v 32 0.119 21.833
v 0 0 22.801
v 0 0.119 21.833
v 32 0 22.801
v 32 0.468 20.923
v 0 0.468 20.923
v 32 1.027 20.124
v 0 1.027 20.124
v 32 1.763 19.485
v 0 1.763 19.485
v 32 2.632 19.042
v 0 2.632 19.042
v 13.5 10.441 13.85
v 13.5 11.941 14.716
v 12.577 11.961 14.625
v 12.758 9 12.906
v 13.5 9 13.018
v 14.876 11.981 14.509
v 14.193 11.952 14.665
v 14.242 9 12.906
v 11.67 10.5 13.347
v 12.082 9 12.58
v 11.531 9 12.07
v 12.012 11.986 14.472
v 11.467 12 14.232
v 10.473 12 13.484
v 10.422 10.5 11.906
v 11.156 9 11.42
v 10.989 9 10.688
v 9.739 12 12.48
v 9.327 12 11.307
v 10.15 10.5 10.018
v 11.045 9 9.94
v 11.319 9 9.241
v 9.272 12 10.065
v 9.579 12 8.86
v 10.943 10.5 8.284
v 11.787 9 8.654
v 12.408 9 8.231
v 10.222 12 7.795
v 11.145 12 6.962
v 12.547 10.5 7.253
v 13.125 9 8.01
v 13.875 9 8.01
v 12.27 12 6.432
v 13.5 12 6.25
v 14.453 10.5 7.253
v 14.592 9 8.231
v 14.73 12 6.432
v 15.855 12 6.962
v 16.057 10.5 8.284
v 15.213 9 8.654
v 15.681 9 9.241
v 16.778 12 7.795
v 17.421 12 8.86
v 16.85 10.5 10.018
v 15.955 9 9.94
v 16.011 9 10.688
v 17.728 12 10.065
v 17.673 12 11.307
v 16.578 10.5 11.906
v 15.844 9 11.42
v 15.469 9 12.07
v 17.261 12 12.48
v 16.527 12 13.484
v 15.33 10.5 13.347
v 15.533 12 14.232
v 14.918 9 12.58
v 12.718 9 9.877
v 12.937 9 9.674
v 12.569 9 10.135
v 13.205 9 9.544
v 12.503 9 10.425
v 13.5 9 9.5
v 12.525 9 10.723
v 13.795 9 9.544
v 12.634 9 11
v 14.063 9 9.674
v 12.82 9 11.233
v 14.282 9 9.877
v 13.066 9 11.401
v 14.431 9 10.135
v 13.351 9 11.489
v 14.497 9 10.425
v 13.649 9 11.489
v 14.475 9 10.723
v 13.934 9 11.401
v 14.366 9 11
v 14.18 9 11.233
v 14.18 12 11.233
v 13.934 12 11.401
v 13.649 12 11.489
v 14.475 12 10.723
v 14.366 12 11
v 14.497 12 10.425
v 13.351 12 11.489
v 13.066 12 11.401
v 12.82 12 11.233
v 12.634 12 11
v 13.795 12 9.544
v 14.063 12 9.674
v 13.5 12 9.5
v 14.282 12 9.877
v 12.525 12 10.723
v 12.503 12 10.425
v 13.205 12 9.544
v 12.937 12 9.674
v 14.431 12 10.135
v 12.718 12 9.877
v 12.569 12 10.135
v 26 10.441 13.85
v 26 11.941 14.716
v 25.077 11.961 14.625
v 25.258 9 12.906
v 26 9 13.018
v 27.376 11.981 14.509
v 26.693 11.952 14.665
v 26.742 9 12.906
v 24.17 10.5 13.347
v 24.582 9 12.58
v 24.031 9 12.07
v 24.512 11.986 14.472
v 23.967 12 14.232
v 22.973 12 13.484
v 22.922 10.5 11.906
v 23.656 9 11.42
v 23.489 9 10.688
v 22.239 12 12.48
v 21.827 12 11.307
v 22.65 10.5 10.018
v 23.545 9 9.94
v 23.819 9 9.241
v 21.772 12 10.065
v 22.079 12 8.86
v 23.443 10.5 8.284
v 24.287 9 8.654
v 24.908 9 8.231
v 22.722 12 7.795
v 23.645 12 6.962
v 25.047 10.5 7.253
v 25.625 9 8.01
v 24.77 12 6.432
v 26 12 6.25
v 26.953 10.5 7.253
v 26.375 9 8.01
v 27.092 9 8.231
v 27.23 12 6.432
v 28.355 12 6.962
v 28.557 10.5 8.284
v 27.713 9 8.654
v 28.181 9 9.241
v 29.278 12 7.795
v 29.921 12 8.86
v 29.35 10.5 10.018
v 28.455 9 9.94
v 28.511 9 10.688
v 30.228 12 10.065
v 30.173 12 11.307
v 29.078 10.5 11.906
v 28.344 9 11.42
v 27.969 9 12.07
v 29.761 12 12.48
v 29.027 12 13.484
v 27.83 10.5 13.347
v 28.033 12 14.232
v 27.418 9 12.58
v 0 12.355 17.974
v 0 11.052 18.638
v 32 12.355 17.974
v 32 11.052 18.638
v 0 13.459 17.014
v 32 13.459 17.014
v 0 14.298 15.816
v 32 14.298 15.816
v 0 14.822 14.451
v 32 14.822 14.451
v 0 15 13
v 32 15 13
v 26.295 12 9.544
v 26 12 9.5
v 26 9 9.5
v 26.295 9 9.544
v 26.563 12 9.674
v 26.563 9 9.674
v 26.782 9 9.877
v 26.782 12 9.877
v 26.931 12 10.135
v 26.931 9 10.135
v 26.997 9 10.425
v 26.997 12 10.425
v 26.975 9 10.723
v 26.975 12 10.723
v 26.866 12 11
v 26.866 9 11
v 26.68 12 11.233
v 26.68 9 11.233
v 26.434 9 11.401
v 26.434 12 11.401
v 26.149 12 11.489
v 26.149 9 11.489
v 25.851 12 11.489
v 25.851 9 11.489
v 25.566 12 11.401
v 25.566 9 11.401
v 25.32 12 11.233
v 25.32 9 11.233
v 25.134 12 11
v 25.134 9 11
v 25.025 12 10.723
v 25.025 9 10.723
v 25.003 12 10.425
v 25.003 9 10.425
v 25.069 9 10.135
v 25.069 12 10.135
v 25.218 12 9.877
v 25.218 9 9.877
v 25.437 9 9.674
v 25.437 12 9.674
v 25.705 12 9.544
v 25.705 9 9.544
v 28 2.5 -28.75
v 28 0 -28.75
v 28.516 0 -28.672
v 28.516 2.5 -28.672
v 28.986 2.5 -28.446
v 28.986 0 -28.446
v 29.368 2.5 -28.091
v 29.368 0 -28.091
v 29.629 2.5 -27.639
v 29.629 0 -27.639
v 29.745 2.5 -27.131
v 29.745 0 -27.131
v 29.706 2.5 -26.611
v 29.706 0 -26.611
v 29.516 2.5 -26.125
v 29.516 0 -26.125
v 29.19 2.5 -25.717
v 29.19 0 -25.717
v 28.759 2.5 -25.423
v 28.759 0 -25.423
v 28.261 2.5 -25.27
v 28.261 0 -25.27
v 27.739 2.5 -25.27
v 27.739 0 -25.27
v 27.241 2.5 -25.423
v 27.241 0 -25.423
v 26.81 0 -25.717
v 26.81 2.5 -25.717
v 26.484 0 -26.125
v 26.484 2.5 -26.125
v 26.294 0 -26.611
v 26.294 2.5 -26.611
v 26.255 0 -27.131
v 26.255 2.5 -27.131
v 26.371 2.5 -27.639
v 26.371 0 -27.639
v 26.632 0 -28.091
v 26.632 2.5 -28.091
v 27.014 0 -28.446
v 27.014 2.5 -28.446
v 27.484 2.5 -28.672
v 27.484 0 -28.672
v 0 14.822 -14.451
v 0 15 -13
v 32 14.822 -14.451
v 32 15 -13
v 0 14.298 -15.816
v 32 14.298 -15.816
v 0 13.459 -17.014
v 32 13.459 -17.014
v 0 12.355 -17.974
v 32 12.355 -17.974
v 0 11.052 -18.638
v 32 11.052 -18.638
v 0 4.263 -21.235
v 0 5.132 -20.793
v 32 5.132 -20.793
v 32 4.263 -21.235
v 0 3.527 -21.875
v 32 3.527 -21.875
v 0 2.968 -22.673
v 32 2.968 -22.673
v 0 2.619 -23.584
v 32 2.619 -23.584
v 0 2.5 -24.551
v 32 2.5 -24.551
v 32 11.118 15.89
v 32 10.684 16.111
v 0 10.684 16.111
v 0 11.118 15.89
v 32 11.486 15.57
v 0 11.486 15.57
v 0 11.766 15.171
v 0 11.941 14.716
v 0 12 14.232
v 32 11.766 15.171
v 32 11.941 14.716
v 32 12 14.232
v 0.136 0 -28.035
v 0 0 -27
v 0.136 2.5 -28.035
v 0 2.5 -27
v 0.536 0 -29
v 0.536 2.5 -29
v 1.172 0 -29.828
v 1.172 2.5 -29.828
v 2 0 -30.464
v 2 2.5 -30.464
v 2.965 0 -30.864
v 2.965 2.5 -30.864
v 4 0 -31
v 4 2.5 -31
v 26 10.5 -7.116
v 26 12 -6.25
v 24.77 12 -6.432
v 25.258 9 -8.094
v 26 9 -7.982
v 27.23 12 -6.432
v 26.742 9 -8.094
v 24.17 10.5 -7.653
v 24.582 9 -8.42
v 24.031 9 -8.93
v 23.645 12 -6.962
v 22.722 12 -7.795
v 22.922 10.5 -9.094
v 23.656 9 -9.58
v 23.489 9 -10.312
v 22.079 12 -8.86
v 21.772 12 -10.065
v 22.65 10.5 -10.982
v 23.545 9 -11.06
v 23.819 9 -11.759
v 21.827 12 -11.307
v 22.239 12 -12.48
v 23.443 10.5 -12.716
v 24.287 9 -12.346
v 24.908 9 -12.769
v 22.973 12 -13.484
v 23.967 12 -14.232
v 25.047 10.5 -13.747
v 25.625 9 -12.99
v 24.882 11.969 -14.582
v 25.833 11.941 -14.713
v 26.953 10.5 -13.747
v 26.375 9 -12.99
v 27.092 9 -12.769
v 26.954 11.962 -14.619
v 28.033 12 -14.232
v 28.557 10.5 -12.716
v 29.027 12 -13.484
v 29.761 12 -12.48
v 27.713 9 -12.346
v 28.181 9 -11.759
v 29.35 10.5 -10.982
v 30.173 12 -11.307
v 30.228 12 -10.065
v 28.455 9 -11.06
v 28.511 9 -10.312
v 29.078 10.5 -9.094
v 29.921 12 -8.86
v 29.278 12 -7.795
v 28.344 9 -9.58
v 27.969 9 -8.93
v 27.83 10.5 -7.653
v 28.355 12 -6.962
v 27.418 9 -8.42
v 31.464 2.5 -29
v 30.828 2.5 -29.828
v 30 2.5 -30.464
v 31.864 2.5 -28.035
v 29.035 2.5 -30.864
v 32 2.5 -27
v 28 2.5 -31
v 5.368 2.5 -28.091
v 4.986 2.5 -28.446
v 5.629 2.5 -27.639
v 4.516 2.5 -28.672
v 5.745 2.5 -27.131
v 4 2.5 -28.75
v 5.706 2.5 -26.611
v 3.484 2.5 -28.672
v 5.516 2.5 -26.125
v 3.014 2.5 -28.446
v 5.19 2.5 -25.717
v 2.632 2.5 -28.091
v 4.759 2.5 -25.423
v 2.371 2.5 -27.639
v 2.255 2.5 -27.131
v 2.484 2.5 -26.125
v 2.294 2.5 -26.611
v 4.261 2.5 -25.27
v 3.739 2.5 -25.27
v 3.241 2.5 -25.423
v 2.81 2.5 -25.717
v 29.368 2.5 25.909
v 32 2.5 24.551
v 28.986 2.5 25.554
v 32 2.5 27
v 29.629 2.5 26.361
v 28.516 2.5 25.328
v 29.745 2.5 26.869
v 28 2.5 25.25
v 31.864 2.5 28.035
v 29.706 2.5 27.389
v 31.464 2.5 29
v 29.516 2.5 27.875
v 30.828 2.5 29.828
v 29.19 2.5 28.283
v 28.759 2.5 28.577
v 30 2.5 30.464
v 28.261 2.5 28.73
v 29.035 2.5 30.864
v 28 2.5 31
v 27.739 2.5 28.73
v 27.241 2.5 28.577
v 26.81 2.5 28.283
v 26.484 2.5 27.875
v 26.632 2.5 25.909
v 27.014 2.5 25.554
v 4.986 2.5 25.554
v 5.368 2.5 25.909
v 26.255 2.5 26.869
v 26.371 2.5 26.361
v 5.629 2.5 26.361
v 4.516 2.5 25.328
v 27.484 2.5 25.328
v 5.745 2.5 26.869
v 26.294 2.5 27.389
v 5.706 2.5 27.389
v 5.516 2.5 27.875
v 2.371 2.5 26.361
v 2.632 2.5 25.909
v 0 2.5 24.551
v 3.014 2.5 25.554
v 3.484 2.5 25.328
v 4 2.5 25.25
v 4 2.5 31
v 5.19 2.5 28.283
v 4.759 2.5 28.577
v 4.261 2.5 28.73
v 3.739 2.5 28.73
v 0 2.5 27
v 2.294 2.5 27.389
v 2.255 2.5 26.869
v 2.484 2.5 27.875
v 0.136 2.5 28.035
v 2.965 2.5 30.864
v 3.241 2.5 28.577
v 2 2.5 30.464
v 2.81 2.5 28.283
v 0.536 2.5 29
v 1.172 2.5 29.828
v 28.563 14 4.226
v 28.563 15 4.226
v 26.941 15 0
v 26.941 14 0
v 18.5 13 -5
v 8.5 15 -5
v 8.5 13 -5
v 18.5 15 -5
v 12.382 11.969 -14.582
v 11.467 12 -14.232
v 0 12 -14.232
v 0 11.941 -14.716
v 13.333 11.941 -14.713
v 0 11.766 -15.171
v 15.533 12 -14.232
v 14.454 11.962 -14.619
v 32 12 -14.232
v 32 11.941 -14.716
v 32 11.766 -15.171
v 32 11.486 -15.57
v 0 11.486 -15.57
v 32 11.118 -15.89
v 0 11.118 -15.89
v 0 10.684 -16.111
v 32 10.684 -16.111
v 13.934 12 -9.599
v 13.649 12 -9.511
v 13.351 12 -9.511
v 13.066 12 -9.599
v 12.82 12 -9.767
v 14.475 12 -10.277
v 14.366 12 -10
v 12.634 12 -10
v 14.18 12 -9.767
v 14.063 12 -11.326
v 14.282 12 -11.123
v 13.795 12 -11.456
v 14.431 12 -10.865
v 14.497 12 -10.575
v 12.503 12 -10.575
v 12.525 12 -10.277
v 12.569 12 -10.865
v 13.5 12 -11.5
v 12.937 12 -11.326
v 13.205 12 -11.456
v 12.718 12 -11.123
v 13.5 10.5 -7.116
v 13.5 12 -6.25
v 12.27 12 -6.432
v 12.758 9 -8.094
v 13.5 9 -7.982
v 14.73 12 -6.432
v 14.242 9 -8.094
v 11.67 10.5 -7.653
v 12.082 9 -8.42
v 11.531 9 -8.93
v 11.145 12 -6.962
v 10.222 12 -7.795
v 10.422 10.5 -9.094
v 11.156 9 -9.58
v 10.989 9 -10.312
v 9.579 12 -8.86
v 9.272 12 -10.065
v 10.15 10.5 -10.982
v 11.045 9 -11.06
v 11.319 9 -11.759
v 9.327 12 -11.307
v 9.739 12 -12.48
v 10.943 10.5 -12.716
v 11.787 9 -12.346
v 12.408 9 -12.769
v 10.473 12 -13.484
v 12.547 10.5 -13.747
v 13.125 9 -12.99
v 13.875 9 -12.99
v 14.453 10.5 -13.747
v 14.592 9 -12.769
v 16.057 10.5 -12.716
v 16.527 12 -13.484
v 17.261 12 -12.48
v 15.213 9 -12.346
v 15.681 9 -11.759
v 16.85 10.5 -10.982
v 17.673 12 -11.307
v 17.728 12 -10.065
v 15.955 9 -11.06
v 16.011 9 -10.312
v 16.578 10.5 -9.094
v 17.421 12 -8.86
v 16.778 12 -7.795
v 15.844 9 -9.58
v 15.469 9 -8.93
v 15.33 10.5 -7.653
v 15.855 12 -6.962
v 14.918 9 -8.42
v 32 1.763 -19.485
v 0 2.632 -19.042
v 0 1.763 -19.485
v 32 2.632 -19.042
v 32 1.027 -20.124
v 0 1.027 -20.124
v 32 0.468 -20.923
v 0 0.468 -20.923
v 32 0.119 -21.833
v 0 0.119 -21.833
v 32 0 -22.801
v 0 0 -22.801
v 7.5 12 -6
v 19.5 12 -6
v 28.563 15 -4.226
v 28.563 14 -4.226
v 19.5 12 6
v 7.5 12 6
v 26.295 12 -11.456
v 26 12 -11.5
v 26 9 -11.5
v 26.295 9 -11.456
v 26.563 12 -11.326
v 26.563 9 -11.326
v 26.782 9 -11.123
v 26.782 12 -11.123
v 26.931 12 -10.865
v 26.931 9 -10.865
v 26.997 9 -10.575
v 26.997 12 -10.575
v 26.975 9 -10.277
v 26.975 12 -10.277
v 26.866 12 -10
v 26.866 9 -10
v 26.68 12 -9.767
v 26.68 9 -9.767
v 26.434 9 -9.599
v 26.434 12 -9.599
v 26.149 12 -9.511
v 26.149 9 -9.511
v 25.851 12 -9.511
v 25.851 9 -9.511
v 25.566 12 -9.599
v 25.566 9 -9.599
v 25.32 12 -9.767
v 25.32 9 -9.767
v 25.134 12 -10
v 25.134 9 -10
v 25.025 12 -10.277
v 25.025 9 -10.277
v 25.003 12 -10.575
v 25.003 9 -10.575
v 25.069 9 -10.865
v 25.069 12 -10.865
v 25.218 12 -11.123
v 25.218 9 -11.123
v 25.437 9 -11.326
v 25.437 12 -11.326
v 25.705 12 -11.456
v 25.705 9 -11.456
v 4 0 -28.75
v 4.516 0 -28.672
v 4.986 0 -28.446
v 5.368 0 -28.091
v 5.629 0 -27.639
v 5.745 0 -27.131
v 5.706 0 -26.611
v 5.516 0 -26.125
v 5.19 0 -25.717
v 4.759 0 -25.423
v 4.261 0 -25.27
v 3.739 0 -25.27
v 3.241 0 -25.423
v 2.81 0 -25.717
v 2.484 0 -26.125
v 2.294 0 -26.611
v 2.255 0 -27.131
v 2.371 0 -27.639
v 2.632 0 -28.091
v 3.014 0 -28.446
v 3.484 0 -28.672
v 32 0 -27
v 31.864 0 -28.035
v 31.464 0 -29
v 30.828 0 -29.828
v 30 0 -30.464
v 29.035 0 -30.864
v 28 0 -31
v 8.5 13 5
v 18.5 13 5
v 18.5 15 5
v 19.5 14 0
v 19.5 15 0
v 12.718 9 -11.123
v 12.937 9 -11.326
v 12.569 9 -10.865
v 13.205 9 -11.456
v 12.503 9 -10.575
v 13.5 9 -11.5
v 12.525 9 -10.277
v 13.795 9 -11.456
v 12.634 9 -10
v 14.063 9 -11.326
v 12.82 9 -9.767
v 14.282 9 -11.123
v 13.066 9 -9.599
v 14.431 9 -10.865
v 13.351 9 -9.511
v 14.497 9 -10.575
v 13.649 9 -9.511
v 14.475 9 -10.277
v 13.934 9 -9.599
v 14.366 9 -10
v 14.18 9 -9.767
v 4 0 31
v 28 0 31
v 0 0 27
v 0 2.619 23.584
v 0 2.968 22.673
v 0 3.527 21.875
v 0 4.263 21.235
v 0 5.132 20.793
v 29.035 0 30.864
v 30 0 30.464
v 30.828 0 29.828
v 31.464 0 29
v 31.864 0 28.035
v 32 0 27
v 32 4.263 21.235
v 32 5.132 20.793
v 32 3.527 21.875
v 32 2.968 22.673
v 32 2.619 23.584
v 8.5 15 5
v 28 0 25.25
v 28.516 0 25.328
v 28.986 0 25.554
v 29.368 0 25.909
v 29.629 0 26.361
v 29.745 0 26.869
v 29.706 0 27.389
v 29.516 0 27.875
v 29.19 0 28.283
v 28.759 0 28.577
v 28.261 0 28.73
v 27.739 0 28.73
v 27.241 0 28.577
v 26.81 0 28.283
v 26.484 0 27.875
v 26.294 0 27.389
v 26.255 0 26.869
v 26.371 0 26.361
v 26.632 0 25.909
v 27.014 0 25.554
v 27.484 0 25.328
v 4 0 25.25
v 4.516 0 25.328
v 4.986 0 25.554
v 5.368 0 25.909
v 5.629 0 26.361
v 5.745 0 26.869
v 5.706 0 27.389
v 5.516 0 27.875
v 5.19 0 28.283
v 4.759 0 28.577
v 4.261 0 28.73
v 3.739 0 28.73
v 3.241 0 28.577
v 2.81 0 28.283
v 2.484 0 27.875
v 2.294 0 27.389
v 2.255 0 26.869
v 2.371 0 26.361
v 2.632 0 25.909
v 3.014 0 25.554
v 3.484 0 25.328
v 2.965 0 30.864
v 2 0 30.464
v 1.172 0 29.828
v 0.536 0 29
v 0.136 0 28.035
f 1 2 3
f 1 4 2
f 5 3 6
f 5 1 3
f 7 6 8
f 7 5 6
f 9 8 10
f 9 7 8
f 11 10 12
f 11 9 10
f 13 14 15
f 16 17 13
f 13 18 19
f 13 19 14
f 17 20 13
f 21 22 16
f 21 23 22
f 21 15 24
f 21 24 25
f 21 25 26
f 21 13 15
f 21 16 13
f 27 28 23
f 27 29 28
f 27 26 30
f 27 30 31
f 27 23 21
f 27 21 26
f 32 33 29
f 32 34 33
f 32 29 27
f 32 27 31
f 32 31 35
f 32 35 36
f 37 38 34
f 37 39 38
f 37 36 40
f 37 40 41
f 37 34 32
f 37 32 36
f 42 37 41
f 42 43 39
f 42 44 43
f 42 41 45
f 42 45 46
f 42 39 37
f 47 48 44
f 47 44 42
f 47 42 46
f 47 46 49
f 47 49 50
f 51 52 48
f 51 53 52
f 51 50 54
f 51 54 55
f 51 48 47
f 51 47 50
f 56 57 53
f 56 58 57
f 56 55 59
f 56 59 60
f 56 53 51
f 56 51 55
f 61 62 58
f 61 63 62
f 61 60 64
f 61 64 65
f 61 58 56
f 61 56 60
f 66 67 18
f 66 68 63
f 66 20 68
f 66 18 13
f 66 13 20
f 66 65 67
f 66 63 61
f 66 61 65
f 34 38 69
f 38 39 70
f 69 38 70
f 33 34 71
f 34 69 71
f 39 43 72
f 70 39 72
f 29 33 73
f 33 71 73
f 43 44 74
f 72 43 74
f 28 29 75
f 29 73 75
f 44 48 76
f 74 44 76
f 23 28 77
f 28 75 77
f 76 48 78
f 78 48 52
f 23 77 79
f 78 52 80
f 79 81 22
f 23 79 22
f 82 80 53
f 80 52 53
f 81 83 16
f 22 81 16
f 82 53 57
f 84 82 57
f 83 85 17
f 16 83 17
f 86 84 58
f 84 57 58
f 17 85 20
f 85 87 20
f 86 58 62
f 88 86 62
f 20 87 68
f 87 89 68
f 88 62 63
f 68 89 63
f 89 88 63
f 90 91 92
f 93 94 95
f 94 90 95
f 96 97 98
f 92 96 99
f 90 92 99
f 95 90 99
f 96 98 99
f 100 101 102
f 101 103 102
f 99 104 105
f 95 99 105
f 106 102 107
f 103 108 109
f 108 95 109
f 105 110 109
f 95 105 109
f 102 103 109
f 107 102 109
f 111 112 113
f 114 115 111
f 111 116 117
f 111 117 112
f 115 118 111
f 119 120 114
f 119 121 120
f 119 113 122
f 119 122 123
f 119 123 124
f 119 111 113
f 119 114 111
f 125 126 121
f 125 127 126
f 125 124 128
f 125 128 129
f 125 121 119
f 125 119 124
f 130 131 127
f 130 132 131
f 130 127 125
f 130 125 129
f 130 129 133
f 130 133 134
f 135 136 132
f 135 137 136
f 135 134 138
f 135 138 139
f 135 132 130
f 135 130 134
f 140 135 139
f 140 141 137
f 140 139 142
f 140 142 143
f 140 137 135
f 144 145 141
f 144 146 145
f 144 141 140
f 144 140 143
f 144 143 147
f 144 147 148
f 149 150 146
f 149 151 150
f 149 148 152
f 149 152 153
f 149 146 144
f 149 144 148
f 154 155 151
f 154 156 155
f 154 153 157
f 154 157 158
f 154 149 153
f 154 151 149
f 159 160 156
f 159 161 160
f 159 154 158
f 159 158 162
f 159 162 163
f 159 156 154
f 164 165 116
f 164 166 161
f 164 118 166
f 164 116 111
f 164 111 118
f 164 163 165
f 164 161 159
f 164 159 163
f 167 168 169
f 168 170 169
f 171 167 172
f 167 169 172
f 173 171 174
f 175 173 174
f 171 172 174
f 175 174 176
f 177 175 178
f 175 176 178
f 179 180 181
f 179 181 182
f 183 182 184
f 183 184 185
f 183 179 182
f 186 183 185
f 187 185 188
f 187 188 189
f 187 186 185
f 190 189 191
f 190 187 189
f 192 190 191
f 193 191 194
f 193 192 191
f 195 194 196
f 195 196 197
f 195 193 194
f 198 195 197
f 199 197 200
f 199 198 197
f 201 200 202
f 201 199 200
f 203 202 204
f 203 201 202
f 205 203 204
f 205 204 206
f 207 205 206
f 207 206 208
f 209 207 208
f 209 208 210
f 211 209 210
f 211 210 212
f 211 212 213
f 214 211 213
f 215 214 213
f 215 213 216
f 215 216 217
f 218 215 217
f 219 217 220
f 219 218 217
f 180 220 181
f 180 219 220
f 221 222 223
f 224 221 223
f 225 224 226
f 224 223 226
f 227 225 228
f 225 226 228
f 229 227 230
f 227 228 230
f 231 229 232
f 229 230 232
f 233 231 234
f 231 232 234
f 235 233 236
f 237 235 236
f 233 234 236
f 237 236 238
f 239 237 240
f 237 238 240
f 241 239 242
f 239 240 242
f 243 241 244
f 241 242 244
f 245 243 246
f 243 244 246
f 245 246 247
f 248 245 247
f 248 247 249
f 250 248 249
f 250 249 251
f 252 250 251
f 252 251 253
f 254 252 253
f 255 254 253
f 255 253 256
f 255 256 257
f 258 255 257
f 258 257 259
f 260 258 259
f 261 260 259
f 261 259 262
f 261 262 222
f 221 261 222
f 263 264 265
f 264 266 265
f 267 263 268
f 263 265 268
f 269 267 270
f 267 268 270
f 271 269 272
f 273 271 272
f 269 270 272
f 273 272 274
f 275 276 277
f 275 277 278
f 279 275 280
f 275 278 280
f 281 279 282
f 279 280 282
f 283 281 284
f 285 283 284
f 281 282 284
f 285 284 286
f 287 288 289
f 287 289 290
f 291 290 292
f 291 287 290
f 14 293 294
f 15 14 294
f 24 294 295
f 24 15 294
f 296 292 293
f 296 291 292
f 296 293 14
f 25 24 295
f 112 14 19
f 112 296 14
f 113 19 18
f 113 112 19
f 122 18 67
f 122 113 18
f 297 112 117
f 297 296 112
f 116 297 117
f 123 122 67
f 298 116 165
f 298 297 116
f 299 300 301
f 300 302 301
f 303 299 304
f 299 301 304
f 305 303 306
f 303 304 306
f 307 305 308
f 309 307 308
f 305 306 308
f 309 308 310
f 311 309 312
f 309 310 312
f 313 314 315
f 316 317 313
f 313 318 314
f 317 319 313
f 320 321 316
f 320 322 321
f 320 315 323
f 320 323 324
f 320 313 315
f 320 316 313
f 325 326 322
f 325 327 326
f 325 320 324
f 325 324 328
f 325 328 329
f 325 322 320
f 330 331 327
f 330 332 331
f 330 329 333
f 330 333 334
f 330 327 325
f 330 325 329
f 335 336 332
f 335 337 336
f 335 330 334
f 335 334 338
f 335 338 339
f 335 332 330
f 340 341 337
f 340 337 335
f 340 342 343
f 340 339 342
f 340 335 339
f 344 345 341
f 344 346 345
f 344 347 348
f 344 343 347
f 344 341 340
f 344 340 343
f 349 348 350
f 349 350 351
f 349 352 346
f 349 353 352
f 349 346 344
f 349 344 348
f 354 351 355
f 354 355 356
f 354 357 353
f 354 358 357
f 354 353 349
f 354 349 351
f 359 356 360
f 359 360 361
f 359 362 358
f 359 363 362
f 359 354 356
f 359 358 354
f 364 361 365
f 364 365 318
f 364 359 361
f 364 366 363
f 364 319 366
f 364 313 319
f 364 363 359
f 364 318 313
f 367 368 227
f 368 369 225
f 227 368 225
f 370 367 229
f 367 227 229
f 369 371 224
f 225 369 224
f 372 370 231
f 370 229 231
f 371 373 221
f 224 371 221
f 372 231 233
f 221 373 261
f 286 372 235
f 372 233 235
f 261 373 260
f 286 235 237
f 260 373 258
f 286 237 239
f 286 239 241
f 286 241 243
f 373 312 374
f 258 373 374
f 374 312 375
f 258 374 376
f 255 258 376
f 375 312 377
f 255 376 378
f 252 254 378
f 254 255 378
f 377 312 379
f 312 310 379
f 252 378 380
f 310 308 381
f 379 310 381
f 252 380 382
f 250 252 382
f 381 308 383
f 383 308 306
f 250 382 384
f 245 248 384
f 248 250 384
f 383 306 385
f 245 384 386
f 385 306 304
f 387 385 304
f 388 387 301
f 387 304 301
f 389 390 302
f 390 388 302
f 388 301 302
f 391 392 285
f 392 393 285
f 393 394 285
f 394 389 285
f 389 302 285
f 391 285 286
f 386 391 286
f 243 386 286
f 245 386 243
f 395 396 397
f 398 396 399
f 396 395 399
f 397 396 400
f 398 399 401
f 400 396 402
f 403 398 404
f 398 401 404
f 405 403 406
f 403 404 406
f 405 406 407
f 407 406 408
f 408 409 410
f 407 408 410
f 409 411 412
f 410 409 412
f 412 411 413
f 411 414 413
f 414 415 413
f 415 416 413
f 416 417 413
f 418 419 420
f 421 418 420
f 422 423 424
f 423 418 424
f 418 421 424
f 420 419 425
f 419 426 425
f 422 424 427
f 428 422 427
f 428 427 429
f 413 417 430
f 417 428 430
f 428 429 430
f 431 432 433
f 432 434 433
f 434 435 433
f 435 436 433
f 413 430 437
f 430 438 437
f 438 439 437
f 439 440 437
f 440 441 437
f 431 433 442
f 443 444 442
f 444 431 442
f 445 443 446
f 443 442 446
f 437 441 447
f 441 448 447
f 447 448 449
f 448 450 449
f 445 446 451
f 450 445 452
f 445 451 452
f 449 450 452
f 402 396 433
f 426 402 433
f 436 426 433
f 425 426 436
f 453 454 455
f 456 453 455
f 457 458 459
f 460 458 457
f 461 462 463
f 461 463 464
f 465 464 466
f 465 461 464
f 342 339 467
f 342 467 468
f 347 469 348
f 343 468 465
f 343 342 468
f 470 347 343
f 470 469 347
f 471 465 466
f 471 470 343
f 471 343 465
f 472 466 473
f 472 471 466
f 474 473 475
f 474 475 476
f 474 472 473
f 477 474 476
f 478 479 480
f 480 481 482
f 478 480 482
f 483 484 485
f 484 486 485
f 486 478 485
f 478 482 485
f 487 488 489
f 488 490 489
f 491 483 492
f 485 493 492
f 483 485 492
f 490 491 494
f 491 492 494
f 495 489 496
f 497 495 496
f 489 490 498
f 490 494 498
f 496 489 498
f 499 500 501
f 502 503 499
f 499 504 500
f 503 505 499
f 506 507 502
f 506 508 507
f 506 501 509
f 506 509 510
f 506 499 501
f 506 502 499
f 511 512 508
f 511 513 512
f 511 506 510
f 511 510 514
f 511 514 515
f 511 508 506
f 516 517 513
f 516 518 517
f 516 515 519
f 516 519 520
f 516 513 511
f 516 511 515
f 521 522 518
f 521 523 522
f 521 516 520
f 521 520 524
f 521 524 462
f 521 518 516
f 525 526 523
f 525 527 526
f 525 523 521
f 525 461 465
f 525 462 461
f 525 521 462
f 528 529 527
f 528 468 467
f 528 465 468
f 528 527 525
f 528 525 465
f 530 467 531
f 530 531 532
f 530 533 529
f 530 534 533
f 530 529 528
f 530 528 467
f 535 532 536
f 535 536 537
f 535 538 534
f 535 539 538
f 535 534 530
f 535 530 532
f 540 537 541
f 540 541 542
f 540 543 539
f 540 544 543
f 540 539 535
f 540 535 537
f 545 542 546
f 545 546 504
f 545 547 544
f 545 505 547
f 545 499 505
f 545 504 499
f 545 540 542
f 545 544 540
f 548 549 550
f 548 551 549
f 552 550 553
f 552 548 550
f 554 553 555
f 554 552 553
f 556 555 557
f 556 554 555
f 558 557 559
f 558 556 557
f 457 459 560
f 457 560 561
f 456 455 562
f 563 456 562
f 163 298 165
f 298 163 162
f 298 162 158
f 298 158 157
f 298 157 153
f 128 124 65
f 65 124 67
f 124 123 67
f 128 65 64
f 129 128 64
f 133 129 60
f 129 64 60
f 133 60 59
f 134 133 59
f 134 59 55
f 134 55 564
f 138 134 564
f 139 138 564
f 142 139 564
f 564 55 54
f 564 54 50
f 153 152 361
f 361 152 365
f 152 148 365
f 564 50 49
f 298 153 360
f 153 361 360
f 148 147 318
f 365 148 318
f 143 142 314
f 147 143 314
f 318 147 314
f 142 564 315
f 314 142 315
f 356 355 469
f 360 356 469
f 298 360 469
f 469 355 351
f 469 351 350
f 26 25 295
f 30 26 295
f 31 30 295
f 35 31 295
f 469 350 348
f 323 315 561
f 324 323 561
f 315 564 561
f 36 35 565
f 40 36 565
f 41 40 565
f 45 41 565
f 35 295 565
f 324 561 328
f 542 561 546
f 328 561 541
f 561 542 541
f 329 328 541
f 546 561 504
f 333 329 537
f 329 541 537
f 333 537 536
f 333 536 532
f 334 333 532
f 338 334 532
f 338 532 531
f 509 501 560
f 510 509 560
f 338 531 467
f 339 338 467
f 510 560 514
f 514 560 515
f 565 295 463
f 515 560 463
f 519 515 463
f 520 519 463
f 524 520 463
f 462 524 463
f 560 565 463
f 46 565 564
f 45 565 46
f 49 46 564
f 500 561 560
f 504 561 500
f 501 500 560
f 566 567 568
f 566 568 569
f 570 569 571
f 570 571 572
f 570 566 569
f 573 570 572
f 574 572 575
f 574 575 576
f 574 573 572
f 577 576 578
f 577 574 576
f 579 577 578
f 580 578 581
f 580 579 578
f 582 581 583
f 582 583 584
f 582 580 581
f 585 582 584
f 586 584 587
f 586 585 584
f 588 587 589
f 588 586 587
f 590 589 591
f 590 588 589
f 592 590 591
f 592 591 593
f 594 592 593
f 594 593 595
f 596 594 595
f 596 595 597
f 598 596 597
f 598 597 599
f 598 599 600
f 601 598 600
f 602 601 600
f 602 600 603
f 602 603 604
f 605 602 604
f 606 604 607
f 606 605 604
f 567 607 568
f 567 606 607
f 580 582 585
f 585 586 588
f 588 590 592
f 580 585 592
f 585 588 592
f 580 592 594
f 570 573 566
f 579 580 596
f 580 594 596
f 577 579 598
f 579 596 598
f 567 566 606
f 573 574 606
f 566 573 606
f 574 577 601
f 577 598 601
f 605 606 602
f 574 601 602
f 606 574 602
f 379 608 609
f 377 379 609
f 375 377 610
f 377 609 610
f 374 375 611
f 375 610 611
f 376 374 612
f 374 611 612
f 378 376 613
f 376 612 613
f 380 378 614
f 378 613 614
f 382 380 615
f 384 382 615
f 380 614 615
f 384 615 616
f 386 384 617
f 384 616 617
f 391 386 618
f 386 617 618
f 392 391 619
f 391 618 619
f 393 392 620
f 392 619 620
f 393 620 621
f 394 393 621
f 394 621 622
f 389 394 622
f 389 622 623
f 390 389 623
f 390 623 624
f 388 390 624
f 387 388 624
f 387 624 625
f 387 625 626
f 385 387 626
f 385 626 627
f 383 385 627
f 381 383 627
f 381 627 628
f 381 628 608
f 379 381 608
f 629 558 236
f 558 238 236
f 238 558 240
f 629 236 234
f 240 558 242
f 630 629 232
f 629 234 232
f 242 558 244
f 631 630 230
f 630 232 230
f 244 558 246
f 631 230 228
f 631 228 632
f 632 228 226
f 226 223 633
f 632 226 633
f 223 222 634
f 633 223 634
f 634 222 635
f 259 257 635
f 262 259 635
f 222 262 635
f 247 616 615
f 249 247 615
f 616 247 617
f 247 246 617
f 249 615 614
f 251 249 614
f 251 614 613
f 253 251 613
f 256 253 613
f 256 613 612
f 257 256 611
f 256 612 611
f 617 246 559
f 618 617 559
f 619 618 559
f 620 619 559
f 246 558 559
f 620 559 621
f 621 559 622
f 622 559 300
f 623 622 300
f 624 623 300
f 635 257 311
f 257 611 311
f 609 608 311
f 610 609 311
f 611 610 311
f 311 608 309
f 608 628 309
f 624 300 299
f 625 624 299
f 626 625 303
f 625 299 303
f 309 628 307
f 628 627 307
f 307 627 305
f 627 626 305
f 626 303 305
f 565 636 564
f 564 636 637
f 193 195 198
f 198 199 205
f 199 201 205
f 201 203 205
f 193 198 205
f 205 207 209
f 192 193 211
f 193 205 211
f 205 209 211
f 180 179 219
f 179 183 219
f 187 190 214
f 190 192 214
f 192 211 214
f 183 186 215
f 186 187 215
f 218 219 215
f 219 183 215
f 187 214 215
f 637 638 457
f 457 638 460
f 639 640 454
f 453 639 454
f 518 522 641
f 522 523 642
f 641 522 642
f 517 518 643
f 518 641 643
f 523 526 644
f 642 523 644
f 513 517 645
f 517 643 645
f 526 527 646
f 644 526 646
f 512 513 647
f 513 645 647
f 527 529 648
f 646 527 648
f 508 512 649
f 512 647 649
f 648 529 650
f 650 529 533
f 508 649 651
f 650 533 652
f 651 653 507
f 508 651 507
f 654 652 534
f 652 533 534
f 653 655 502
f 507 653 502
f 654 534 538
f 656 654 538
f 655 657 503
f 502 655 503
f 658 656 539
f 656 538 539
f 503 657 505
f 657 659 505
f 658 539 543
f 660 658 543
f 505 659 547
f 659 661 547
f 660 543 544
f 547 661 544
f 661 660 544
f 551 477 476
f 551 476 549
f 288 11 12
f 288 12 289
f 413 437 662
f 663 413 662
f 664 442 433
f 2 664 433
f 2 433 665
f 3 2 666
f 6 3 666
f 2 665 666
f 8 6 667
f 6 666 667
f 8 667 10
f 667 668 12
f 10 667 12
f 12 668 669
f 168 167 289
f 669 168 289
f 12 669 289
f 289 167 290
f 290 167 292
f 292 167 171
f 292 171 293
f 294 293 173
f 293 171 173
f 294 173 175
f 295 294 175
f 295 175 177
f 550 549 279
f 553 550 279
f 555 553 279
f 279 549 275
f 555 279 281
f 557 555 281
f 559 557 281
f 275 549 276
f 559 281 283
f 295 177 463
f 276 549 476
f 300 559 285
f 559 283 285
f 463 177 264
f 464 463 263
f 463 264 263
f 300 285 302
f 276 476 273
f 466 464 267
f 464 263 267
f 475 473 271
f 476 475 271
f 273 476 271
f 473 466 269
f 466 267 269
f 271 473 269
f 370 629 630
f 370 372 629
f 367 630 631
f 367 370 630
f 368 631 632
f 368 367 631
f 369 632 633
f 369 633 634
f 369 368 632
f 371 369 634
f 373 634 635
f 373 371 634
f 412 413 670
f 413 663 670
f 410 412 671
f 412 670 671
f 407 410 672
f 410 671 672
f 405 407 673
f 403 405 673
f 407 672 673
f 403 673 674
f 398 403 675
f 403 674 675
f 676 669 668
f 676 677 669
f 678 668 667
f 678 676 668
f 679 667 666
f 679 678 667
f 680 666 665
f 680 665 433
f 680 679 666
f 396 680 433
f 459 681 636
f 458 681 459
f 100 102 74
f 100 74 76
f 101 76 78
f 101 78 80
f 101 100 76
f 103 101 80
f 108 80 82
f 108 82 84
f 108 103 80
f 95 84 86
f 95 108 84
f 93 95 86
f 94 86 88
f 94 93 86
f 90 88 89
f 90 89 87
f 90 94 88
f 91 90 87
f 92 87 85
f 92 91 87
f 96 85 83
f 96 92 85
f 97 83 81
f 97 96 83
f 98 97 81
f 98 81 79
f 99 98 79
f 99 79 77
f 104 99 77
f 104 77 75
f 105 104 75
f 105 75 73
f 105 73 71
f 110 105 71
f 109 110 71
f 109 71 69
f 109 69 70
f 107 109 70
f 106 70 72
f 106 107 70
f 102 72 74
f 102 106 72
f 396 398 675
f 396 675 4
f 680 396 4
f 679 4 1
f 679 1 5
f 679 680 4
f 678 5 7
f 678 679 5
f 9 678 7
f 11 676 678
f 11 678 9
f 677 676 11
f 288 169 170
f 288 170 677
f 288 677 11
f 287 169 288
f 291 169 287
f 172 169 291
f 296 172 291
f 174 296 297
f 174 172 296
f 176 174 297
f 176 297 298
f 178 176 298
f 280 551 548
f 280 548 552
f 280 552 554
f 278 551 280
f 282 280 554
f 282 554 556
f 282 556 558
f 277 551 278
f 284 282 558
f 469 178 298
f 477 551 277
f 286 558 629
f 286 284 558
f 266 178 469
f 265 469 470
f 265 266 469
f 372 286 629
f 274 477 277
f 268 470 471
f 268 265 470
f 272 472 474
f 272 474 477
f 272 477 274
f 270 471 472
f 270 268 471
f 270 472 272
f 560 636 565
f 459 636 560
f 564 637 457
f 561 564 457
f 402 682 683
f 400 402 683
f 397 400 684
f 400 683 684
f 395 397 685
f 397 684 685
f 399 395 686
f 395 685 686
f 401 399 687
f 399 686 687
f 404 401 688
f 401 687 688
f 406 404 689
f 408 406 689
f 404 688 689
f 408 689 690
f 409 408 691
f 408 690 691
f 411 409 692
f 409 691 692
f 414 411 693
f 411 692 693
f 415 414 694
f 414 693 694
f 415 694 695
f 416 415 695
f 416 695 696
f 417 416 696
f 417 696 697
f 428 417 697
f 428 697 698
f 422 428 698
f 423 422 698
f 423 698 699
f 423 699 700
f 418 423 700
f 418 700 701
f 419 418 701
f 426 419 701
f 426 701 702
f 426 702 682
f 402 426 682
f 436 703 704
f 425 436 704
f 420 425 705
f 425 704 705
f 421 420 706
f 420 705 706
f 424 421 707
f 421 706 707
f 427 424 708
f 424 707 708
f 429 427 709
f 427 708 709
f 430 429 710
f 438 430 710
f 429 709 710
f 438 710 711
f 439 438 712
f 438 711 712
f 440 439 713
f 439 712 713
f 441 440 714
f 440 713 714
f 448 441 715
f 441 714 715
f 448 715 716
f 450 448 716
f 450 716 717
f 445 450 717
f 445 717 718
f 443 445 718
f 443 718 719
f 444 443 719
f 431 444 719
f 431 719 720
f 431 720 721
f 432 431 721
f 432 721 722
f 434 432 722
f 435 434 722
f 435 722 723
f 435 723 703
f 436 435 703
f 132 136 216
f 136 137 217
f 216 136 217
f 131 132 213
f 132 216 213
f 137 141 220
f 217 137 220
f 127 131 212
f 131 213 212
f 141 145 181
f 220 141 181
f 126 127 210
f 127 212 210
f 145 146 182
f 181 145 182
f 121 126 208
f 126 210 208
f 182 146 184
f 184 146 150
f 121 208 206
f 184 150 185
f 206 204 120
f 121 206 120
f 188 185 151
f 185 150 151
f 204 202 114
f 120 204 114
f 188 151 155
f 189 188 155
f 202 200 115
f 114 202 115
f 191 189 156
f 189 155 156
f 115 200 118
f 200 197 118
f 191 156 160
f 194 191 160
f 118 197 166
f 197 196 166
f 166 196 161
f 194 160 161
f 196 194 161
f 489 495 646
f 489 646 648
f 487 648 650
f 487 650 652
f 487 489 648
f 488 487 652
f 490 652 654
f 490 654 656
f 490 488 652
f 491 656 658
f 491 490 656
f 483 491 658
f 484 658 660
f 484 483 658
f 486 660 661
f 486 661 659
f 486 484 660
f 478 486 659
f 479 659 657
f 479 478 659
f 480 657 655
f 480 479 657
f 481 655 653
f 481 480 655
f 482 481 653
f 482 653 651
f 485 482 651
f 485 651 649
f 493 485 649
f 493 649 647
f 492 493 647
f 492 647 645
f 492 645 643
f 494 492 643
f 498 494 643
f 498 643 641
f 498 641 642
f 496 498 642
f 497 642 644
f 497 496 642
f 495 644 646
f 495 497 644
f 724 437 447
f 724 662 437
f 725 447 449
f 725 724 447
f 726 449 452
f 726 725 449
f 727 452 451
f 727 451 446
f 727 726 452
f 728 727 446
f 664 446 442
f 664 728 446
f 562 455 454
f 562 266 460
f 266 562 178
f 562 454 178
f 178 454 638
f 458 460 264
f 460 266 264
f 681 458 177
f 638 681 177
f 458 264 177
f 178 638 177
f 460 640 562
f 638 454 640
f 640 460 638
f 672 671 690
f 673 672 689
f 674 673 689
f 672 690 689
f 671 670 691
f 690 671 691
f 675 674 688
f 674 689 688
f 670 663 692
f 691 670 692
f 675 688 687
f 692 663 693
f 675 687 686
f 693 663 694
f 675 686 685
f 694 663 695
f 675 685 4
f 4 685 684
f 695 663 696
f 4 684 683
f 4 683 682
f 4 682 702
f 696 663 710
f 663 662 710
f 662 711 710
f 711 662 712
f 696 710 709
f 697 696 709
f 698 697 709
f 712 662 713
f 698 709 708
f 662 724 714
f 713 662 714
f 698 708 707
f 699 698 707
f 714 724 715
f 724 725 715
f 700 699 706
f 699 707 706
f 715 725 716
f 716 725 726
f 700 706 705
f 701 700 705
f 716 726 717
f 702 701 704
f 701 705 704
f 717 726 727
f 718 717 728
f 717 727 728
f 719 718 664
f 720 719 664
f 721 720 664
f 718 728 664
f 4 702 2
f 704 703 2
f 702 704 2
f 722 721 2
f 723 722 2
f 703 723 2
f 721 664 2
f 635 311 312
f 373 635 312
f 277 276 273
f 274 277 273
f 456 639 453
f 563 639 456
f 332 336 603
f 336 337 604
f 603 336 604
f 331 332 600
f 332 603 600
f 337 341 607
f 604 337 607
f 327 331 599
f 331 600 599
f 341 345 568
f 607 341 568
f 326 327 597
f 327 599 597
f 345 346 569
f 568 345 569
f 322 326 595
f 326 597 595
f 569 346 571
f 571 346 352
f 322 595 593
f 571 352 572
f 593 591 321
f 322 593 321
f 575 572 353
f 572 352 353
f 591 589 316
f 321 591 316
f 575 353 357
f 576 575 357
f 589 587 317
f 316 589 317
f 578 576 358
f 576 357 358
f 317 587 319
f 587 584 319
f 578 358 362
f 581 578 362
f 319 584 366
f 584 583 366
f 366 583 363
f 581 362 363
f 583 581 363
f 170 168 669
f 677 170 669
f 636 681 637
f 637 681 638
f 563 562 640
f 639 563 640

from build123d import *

# Parameters (mm, degrees)
EXTRUDE_1_DEPTH                      = 32
SKETCH_2_R                           = 1.75
CUT_EXTRUDE_1_DEPTH                  = 48.010637094
PATTERN_LINEAR_1_COUNT               = 2
PATTERN_LINEAR_1_PITCH               = 24
PATTERN_LINEAR_1_COUNT_DIR2          = 2
PATTERN_LINEAR_1_PITCH_DIR2          = 54
FILLET_1_R                           = 4
FILLET_3_R                           = 6
FILLET_5_R                           = 4
SKETCH_4_W                           = 10
SKETCH_4_H                           = 10
CUT_EXTRUDE_3_DEPTH                  = 48.010637094
FILLET_6_R                           = 2
SKETCH_3_R                           = 2.5
SKETCH_3_R_2                         = 1
EXTRUDE_3_DEPTH                      = 3
CHAMFER_3_SIZE                       = 1.75
CHAMFER_3_SIZE_2                     = 3.031088913
PATTERN_LINEAR_5_COUNT               = 2
PATTERN_LINEAR_5_PITCH               = 12.5
PATTERN_LINEAR_5_COUNT_DIR2          = 2
PATTERN_LINEAR_5_PITCH_DIR2          = 21
CHAMFER_3_OF_PATTERN_LINEAR_5_SIZE   = 1.75
CHAMFER_3_OF_PATTERN_LINEAR_5_SIZE_2 = 3.031088913
CUT_EXTRUDE_5_DEPTH                  = 1
CHAMFER_4_SIZE                       = 1


with BuildPart() as part:
    # Эскиз1 → Бобышка-Вытянуть1 (new body)
    with BuildSketch(Plane(origin=(0, 0, 0), x_dir=(0, 0, -1), z_dir=(1, 0, 0))):
        Polygon((-31, 0), (-20, 0), (-15.632357189, 12), (15.632357189, 12), (20, 0), (31, 0), (31, 2.5), (21.750518846, 2.5), (17.200890917, 15), (-17.200890917, 15), (-21.750518846, 2.5), (-31, 2.5), align=None)
    extrude(amount=EXTRUDE_1_DEPTH)

    # Эскиз2 → Вырез-Вытянуть1 (cut, through all)
    with BuildSketch(Plane.XZ):
        with Locations(Location((4, 27, 0), (0, 0, 270))):
            Circle(SKETCH_2_R)
    cut_extrude_1 = extrude(amount=-CUT_EXTRUDE_1_DEPTH, mode=Mode.SUBTRACT)

    # Линейный массив1: Cut-Extrude 1 2 × 2
    with Locations(*[(i * PATTERN_LINEAR_1_PITCH, 0, -j * PATTERN_LINEAR_1_PITCH_DIR2) for i in range(PATTERN_LINEAR_1_COUNT) for j in range(PATTERN_LINEAR_1_COUNT_DIR2) if (i, j) != (0, 0)]):
        add(cut_extrude_1, mode=Mode.SUBTRACT)

    # Скругление1
    fillet_1_edges = [part.edges().sort_by_distance(p)[0] for p in [
        (0, 1.25, -31),
        (0, 1.25, 31),
        (32, 1.25, -31),
        (32, 1.25, 31),
    ]]
    fillet(fillet_1_edges, radius=FILLET_1_R)

    # Скругление3
    fillet_3_edges = [part.edges().sort_by_distance(p)[0] for p in [
        (16, 15, 17.200890917),
        (16, 15, -17.200890917),
    ]]
    fillet(fillet_3_edges, radius=FILLET_3_R)

    # Скругление5
    fillet_5_edges = [part.edges().sort_by_distance(p)[0] for p in [
        (16, 2.5, 21.750518846),
        (16, 2.5, -21.750518846),
        (16, 0, -20),
        (16, 0, 20),
    ]]
    fillet(fillet_5_edges, radius=FILLET_5_R)

    # Эскиз4 → Вырез-Вытянуть3 (cut, through all)
    with BuildSketch(Plane(origin=(0, 15, 0), x_dir=(1, 0, 0), z_dir=(0, 1, 0))):
        with Locations((13.5, 0)):
            Rectangle(SKETCH_4_W, SKETCH_4_H)
    extrude(amount=-CUT_EXTRUDE_3_DEPTH, mode=Mode.SUBTRACT)

    # Скругление6
    fillet_6_edges = [part.edges().sort_by_distance(p)[0] for p in [
        (16, 12, -15.632357189),
        (16, 12, 15.632357189),
    ]]
    fillet(fillet_6_edges, radius=FILLET_6_R)

    # Эскиз3 → Бобышка-Вытянуть3 (add)
    with BuildSketch(Plane.XZ.offset(-12)):
        with Locations(Location((26, 10.5, 0), (0, 0, 90))):
            Circle(SKETCH_3_R)
        with Locations(Location((26, 10.5, 0), (0, 0, 270))):
            Circle(SKETCH_3_R_2, mode=Mode.SUBTRACT)
    extrude_3 = extrude(amount=EXTRUDE_3_DEPTH)

    # Фаска3
    # the kernel refuses this chamfer: 3.031088913, 1.75 mm, written as the material it adds along each edge
    with BuildSketch(Plane(origin=(26, 12, 10.5), x_dir=(0, 0, 1), z_dir=(1, 0, 0))) as chamfer_3_piece_1_section:
        Polygon((2.5 + CHAMFER_3_SIZE, 0), (2.5, CHAMFER_3_SIZE_2), (2.5, 0), align=None)
    chamfer_3_piece_1 = revolve(axis=Axis((26, 12, 10.5), (0, -1, 0)), mode=Mode.PRIVATE)
    chamfer_3_piece_1 = split(chamfer_3_piece_1, bisect_by=Plane(origin=(26, 9, 7.119181545), z_dir=(0, 1, 0)), keep=Keep.TOP, mode=Mode.PRIVATE)
    add(chamfer_3_piece_1)

    # Линейный массив5: Extrude 3 2 × 2
    with Locations(*[(-i * PATTERN_LINEAR_5_PITCH, 0, -j * PATTERN_LINEAR_5_PITCH_DIR2) for i in range(PATTERN_LINEAR_5_COUNT) for j in range(PATTERN_LINEAR_5_COUNT_DIR2) if (i, j) != (0, 0)]):
        add(extrude_3)

    # Фаска3 of Линейный массив5
    # the kernel refuses this chamfer: 3.031088913, 1.75 mm, written as the material it adds along each edge
    with BuildSketch(Plane(origin=(26, 12, -10.5), x_dir=(0, 0, 1), z_dir=(1, 0, 0))) as chamfer_3_of_pattern_linear_5_piece_1_section:
        Polygon((2.5 + CHAMFER_3_OF_PATTERN_LINEAR_5_SIZE, 0), (2.5, CHAMFER_3_OF_PATTERN_LINEAR_5_SIZE_2), (2.5, 0), align=None)
    chamfer_3_of_pattern_linear_5_piece_1 = revolve(axis=Axis((26, 12, -10.5), (0, -1, 0)), mode=Mode.PRIVATE)
    chamfer_3_of_pattern_linear_5_piece_1 = split(chamfer_3_of_pattern_linear_5_piece_1, bisect_by=Plane(origin=(26, 9, -13.880818454), z_dir=(0, 1, 0)), keep=Keep.TOP, mode=Mode.PRIVATE)
    add(chamfer_3_of_pattern_linear_5_piece_1)
    with BuildSketch(Plane(origin=(13.5, 12, 10.5), x_dir=(0, 0, 1), z_dir=(1, 0, 0))) as chamfer_3_of_pattern_linear_5_piece_2_section:
        Polygon((2.5 + CHAMFER_3_OF_PATTERN_LINEAR_5_SIZE, 0), (2.5, CHAMFER_3_OF_PATTERN_LINEAR_5_SIZE_2), (2.5, 0), align=None)
    chamfer_3_of_pattern_linear_5_piece_2 = revolve(axis=Axis((13.5, 12, 10.5), (0, -1, 0)), mode=Mode.PRIVATE)
    chamfer_3_of_pattern_linear_5_piece_2 = split(chamfer_3_of_pattern_linear_5_piece_2, bisect_by=Plane(origin=(13.5, 9, 7.119181545), z_dir=(0, 1, 0)), keep=Keep.TOP, mode=Mode.PRIVATE)
    add(chamfer_3_of_pattern_linear_5_piece_2)
    with BuildSketch(Plane(origin=(13.5, 12, -10.5), x_dir=(0, 0, 1), z_dir=(1, 0, 0))) as chamfer_3_of_pattern_linear_5_piece_3_section:
        Polygon((2.5 + CHAMFER_3_OF_PATTERN_LINEAR_5_SIZE, 0), (2.5, CHAMFER_3_OF_PATTERN_LINEAR_5_SIZE_2), (2.5, 0), align=None)
    chamfer_3_of_pattern_linear_5_piece_3 = revolve(axis=Axis((13.5, 12, -10.5), (0, -1, 0)), mode=Mode.PRIVATE)
    chamfer_3_of_pattern_linear_5_piece_3 = split(chamfer_3_of_pattern_linear_5_piece_3, bisect_by=Plane(origin=(13.5, 9, -13.880818454), z_dir=(0, 1, 0)), keep=Keep.TOP, mode=Mode.PRIVATE)
    add(chamfer_3_of_pattern_linear_5_piece_3)

    # Эскиз12 → Вырез-Вытянуть5 (cut)
    with BuildSketch(Plane(origin=(0, 15, 0), x_dir=(1, 0, 0), z_dir=(0, 1, 0))):
        Polygon((19.5, 0), (28.56307787, -4.226182617), (26.940798358, 0), (28.56307787, 4.226182617), align=None)
    extrude(amount=-CUT_EXTRUDE_5_DEPTH, mode=Mode.SUBTRACT)

    # Фаска4
    chamfer_4_edges = [part.edges().sort_by_distance(p)[0] for p in [
        (13.5, 12, 5),
        (8.5, 12, 0),
        (13.5, 12, -5),
        (18.5, 12, 0),
    ]]
    chamfer(chamfer_4_edges, length=CHAMFER_4_SIZE)


solid = part.part
